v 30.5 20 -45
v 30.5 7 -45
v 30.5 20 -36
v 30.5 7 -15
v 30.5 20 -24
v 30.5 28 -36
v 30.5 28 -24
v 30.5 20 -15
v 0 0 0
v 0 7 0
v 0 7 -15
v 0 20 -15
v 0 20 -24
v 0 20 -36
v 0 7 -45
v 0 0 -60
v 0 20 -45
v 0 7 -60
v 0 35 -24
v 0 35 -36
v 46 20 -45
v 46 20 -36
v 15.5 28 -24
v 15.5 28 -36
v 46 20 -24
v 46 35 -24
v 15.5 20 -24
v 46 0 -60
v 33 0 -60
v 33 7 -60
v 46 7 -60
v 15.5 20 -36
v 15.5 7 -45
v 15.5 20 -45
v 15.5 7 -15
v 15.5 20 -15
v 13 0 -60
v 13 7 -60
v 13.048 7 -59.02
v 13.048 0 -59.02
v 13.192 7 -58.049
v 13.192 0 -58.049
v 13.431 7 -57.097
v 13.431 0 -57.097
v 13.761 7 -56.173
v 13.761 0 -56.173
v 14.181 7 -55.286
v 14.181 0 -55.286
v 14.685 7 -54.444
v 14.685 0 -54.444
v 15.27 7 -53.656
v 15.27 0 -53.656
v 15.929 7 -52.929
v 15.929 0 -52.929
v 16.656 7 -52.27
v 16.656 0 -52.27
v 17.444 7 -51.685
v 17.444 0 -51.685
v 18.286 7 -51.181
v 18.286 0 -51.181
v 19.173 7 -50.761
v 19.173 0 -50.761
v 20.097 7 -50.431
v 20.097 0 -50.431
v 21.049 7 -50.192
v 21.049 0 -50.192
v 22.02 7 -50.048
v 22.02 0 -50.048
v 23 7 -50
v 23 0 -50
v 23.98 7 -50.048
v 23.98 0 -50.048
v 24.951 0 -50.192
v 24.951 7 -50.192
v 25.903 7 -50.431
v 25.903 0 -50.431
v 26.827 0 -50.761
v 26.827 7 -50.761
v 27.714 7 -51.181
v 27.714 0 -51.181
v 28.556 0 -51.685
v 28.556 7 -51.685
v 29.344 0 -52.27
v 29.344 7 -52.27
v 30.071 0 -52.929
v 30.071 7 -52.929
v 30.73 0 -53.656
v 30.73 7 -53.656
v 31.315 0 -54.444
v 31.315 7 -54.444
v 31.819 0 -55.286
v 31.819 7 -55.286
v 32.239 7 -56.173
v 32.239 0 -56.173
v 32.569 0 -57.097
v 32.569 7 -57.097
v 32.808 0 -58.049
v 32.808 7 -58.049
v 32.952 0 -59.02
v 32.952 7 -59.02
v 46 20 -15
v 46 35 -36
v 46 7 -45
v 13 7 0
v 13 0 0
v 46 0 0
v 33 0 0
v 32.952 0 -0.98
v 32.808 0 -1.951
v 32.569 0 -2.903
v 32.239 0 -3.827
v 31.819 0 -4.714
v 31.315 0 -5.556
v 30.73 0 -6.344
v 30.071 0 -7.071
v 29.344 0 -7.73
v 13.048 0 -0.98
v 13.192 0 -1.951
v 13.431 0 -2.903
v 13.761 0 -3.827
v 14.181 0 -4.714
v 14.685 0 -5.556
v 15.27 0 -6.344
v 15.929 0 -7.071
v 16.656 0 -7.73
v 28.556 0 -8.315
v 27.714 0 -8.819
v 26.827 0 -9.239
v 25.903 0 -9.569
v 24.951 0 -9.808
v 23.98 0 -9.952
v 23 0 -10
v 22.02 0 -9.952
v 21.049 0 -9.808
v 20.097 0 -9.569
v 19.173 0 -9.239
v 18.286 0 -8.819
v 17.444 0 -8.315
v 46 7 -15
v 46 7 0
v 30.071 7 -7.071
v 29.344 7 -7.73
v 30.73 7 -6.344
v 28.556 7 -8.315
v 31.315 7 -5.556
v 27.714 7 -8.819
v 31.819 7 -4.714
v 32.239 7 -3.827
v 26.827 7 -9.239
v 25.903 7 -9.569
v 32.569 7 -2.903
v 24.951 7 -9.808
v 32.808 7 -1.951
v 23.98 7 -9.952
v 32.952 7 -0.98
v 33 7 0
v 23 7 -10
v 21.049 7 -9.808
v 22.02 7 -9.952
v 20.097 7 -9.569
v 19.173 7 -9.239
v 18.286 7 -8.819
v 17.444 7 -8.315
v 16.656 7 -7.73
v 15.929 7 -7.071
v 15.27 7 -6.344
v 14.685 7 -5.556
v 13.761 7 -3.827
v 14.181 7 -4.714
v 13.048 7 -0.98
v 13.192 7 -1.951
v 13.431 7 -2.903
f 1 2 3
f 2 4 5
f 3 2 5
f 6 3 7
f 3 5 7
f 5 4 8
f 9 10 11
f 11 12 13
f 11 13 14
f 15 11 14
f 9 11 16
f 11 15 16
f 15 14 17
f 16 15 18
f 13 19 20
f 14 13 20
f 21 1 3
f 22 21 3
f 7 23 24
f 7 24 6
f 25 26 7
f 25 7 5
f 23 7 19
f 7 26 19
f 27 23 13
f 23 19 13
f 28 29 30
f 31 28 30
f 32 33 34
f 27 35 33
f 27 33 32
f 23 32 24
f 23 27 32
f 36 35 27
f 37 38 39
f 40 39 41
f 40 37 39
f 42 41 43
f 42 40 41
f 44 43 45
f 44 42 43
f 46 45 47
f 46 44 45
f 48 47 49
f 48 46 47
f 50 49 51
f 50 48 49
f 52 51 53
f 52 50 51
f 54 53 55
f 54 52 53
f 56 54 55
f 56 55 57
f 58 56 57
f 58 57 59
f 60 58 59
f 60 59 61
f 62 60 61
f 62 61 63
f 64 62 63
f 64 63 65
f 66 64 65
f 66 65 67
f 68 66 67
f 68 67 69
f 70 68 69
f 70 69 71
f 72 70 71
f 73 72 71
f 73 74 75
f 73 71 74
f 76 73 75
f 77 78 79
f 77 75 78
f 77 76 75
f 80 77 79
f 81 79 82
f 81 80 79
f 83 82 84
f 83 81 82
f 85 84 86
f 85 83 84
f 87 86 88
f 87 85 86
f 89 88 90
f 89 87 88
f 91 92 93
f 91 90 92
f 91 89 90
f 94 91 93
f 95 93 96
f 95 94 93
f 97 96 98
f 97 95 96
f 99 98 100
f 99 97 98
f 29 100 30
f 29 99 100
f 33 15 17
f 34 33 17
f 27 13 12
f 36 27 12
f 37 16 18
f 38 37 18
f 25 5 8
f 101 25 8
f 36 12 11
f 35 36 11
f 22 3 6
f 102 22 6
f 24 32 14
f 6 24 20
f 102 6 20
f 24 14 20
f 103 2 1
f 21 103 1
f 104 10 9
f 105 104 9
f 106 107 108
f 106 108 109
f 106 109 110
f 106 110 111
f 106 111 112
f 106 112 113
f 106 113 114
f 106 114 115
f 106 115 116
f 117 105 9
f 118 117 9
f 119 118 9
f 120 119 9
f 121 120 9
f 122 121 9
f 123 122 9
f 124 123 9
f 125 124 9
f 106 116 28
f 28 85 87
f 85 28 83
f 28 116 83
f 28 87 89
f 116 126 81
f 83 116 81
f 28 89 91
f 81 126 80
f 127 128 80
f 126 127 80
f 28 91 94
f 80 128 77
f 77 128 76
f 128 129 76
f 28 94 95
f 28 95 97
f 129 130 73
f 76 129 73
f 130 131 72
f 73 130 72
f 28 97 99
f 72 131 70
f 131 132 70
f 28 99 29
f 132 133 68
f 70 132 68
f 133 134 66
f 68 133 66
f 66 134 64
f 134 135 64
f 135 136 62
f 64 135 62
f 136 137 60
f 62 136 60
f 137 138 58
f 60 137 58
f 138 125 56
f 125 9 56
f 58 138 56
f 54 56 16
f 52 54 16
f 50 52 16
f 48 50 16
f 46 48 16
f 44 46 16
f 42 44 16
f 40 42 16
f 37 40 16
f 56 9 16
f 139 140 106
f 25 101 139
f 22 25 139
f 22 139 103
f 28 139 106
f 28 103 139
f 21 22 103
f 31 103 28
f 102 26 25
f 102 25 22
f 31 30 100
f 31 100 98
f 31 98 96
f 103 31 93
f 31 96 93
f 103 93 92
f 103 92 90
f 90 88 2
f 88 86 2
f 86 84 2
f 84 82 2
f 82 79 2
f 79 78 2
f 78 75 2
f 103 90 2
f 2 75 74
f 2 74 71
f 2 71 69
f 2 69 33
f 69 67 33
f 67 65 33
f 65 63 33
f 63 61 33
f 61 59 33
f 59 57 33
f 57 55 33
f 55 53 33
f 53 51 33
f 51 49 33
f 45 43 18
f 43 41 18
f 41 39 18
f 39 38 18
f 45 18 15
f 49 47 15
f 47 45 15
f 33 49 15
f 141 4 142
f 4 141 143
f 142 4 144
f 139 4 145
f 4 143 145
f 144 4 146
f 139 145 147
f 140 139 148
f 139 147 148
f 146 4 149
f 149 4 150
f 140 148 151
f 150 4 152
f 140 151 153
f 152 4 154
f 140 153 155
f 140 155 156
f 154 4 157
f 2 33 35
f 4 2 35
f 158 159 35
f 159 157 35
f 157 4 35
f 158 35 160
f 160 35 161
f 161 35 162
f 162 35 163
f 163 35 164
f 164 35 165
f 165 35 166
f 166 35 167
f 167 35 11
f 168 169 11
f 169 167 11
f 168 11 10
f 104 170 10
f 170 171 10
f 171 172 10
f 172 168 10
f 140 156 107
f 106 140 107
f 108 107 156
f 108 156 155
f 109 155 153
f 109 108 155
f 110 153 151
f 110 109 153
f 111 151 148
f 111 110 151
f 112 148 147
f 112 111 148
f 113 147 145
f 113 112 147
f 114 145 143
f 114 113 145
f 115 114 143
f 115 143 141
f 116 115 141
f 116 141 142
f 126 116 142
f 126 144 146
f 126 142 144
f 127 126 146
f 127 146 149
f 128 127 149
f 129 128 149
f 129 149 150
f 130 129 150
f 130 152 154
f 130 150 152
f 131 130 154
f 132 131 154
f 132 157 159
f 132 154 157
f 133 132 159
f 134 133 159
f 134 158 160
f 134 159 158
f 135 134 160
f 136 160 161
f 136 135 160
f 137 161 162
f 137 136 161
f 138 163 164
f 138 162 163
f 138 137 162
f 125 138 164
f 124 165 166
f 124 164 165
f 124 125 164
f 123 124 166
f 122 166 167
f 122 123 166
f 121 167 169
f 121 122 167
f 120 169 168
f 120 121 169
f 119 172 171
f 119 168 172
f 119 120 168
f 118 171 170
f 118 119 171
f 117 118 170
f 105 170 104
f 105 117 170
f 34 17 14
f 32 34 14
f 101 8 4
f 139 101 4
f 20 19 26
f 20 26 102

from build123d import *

# Parameters (mm, degrees)
SKETCH1_W               = 12
SKETCH1_H               = 7
BOSS_EXTRUDE1_DEPTH     = 46
CUT_EXTRUDE2_DEPTH      = 46
CUT_EXTRUDE2_DEPTH_BACK = 46
SKETCH6_W               = 15
SKETCH6_H               = 21
CUT_EXTRUDE3_DEPTH      = 60


with BuildPart() as part:
    # Sketch1 → Boss-Extrude1 (new body)
    with BuildSketch(Plane(origin=(0, 0, 0), x_dir=(0, 0, -1), z_dir=(1, 0, 0))):
        with Locations((30, 31.5)):
            Rectangle(SKETCH1_W, SKETCH1_H)
        Polygon((0, 7), (0, 0), (60, 0), (60, 7), (45, 7), (45, 20), (36, 20), (36, 28), (24, 28), (24, 20), (15, 20), (15, 7), align=None)
    extrude(amount=BOSS_EXTRUDE1_DEPTH)

    # Sketch2 → Cut-Extrude2 (cut, two sides: drawn at the far end of the back side and taken through both)
    with BuildSketch(Plane(origin=(0, 0, 0), x_dir=(1, 0, 0), z_dir=(0, 1, 0)).offset(-CUT_EXTRUDE2_DEPTH_BACK)):
        with BuildLine():
            ThreePointArc((33, 0), (23, 10), (13, 0))
            Line((13, 0), (33, 0))
        make_face()
        with BuildLine():
            Line((33, 0), (13, 0))
            ThreePointArc((13, 0), (23, -10), (33, 0))
        make_face()
        with BuildLine():
            ThreePointArc((33, 60), (23, 70), (13, 60))
            Line((13, 60), (33, 60))
        make_face()
        with BuildLine():
            Line((33, 60), (13, 60))
            ThreePointArc((13, 60), (23, 50), (33, 60))
        make_face()
    extrude(amount=CUT_EXTRUDE2_DEPTH + CUT_EXTRUDE2_DEPTH_BACK, mode=Mode.SUBTRACT)

    # Sketch6 → Cut-Extrude3 (cut)
    with BuildSketch(Plane.XY):
        with Locations((23, 17.5)):
            Rectangle(SKETCH6_W, SKETCH6_H)
    extrude(amount=-CUT_EXTRUDE3_DEPTH, mode=Mode.SUBTRACT)


solid = part.part
